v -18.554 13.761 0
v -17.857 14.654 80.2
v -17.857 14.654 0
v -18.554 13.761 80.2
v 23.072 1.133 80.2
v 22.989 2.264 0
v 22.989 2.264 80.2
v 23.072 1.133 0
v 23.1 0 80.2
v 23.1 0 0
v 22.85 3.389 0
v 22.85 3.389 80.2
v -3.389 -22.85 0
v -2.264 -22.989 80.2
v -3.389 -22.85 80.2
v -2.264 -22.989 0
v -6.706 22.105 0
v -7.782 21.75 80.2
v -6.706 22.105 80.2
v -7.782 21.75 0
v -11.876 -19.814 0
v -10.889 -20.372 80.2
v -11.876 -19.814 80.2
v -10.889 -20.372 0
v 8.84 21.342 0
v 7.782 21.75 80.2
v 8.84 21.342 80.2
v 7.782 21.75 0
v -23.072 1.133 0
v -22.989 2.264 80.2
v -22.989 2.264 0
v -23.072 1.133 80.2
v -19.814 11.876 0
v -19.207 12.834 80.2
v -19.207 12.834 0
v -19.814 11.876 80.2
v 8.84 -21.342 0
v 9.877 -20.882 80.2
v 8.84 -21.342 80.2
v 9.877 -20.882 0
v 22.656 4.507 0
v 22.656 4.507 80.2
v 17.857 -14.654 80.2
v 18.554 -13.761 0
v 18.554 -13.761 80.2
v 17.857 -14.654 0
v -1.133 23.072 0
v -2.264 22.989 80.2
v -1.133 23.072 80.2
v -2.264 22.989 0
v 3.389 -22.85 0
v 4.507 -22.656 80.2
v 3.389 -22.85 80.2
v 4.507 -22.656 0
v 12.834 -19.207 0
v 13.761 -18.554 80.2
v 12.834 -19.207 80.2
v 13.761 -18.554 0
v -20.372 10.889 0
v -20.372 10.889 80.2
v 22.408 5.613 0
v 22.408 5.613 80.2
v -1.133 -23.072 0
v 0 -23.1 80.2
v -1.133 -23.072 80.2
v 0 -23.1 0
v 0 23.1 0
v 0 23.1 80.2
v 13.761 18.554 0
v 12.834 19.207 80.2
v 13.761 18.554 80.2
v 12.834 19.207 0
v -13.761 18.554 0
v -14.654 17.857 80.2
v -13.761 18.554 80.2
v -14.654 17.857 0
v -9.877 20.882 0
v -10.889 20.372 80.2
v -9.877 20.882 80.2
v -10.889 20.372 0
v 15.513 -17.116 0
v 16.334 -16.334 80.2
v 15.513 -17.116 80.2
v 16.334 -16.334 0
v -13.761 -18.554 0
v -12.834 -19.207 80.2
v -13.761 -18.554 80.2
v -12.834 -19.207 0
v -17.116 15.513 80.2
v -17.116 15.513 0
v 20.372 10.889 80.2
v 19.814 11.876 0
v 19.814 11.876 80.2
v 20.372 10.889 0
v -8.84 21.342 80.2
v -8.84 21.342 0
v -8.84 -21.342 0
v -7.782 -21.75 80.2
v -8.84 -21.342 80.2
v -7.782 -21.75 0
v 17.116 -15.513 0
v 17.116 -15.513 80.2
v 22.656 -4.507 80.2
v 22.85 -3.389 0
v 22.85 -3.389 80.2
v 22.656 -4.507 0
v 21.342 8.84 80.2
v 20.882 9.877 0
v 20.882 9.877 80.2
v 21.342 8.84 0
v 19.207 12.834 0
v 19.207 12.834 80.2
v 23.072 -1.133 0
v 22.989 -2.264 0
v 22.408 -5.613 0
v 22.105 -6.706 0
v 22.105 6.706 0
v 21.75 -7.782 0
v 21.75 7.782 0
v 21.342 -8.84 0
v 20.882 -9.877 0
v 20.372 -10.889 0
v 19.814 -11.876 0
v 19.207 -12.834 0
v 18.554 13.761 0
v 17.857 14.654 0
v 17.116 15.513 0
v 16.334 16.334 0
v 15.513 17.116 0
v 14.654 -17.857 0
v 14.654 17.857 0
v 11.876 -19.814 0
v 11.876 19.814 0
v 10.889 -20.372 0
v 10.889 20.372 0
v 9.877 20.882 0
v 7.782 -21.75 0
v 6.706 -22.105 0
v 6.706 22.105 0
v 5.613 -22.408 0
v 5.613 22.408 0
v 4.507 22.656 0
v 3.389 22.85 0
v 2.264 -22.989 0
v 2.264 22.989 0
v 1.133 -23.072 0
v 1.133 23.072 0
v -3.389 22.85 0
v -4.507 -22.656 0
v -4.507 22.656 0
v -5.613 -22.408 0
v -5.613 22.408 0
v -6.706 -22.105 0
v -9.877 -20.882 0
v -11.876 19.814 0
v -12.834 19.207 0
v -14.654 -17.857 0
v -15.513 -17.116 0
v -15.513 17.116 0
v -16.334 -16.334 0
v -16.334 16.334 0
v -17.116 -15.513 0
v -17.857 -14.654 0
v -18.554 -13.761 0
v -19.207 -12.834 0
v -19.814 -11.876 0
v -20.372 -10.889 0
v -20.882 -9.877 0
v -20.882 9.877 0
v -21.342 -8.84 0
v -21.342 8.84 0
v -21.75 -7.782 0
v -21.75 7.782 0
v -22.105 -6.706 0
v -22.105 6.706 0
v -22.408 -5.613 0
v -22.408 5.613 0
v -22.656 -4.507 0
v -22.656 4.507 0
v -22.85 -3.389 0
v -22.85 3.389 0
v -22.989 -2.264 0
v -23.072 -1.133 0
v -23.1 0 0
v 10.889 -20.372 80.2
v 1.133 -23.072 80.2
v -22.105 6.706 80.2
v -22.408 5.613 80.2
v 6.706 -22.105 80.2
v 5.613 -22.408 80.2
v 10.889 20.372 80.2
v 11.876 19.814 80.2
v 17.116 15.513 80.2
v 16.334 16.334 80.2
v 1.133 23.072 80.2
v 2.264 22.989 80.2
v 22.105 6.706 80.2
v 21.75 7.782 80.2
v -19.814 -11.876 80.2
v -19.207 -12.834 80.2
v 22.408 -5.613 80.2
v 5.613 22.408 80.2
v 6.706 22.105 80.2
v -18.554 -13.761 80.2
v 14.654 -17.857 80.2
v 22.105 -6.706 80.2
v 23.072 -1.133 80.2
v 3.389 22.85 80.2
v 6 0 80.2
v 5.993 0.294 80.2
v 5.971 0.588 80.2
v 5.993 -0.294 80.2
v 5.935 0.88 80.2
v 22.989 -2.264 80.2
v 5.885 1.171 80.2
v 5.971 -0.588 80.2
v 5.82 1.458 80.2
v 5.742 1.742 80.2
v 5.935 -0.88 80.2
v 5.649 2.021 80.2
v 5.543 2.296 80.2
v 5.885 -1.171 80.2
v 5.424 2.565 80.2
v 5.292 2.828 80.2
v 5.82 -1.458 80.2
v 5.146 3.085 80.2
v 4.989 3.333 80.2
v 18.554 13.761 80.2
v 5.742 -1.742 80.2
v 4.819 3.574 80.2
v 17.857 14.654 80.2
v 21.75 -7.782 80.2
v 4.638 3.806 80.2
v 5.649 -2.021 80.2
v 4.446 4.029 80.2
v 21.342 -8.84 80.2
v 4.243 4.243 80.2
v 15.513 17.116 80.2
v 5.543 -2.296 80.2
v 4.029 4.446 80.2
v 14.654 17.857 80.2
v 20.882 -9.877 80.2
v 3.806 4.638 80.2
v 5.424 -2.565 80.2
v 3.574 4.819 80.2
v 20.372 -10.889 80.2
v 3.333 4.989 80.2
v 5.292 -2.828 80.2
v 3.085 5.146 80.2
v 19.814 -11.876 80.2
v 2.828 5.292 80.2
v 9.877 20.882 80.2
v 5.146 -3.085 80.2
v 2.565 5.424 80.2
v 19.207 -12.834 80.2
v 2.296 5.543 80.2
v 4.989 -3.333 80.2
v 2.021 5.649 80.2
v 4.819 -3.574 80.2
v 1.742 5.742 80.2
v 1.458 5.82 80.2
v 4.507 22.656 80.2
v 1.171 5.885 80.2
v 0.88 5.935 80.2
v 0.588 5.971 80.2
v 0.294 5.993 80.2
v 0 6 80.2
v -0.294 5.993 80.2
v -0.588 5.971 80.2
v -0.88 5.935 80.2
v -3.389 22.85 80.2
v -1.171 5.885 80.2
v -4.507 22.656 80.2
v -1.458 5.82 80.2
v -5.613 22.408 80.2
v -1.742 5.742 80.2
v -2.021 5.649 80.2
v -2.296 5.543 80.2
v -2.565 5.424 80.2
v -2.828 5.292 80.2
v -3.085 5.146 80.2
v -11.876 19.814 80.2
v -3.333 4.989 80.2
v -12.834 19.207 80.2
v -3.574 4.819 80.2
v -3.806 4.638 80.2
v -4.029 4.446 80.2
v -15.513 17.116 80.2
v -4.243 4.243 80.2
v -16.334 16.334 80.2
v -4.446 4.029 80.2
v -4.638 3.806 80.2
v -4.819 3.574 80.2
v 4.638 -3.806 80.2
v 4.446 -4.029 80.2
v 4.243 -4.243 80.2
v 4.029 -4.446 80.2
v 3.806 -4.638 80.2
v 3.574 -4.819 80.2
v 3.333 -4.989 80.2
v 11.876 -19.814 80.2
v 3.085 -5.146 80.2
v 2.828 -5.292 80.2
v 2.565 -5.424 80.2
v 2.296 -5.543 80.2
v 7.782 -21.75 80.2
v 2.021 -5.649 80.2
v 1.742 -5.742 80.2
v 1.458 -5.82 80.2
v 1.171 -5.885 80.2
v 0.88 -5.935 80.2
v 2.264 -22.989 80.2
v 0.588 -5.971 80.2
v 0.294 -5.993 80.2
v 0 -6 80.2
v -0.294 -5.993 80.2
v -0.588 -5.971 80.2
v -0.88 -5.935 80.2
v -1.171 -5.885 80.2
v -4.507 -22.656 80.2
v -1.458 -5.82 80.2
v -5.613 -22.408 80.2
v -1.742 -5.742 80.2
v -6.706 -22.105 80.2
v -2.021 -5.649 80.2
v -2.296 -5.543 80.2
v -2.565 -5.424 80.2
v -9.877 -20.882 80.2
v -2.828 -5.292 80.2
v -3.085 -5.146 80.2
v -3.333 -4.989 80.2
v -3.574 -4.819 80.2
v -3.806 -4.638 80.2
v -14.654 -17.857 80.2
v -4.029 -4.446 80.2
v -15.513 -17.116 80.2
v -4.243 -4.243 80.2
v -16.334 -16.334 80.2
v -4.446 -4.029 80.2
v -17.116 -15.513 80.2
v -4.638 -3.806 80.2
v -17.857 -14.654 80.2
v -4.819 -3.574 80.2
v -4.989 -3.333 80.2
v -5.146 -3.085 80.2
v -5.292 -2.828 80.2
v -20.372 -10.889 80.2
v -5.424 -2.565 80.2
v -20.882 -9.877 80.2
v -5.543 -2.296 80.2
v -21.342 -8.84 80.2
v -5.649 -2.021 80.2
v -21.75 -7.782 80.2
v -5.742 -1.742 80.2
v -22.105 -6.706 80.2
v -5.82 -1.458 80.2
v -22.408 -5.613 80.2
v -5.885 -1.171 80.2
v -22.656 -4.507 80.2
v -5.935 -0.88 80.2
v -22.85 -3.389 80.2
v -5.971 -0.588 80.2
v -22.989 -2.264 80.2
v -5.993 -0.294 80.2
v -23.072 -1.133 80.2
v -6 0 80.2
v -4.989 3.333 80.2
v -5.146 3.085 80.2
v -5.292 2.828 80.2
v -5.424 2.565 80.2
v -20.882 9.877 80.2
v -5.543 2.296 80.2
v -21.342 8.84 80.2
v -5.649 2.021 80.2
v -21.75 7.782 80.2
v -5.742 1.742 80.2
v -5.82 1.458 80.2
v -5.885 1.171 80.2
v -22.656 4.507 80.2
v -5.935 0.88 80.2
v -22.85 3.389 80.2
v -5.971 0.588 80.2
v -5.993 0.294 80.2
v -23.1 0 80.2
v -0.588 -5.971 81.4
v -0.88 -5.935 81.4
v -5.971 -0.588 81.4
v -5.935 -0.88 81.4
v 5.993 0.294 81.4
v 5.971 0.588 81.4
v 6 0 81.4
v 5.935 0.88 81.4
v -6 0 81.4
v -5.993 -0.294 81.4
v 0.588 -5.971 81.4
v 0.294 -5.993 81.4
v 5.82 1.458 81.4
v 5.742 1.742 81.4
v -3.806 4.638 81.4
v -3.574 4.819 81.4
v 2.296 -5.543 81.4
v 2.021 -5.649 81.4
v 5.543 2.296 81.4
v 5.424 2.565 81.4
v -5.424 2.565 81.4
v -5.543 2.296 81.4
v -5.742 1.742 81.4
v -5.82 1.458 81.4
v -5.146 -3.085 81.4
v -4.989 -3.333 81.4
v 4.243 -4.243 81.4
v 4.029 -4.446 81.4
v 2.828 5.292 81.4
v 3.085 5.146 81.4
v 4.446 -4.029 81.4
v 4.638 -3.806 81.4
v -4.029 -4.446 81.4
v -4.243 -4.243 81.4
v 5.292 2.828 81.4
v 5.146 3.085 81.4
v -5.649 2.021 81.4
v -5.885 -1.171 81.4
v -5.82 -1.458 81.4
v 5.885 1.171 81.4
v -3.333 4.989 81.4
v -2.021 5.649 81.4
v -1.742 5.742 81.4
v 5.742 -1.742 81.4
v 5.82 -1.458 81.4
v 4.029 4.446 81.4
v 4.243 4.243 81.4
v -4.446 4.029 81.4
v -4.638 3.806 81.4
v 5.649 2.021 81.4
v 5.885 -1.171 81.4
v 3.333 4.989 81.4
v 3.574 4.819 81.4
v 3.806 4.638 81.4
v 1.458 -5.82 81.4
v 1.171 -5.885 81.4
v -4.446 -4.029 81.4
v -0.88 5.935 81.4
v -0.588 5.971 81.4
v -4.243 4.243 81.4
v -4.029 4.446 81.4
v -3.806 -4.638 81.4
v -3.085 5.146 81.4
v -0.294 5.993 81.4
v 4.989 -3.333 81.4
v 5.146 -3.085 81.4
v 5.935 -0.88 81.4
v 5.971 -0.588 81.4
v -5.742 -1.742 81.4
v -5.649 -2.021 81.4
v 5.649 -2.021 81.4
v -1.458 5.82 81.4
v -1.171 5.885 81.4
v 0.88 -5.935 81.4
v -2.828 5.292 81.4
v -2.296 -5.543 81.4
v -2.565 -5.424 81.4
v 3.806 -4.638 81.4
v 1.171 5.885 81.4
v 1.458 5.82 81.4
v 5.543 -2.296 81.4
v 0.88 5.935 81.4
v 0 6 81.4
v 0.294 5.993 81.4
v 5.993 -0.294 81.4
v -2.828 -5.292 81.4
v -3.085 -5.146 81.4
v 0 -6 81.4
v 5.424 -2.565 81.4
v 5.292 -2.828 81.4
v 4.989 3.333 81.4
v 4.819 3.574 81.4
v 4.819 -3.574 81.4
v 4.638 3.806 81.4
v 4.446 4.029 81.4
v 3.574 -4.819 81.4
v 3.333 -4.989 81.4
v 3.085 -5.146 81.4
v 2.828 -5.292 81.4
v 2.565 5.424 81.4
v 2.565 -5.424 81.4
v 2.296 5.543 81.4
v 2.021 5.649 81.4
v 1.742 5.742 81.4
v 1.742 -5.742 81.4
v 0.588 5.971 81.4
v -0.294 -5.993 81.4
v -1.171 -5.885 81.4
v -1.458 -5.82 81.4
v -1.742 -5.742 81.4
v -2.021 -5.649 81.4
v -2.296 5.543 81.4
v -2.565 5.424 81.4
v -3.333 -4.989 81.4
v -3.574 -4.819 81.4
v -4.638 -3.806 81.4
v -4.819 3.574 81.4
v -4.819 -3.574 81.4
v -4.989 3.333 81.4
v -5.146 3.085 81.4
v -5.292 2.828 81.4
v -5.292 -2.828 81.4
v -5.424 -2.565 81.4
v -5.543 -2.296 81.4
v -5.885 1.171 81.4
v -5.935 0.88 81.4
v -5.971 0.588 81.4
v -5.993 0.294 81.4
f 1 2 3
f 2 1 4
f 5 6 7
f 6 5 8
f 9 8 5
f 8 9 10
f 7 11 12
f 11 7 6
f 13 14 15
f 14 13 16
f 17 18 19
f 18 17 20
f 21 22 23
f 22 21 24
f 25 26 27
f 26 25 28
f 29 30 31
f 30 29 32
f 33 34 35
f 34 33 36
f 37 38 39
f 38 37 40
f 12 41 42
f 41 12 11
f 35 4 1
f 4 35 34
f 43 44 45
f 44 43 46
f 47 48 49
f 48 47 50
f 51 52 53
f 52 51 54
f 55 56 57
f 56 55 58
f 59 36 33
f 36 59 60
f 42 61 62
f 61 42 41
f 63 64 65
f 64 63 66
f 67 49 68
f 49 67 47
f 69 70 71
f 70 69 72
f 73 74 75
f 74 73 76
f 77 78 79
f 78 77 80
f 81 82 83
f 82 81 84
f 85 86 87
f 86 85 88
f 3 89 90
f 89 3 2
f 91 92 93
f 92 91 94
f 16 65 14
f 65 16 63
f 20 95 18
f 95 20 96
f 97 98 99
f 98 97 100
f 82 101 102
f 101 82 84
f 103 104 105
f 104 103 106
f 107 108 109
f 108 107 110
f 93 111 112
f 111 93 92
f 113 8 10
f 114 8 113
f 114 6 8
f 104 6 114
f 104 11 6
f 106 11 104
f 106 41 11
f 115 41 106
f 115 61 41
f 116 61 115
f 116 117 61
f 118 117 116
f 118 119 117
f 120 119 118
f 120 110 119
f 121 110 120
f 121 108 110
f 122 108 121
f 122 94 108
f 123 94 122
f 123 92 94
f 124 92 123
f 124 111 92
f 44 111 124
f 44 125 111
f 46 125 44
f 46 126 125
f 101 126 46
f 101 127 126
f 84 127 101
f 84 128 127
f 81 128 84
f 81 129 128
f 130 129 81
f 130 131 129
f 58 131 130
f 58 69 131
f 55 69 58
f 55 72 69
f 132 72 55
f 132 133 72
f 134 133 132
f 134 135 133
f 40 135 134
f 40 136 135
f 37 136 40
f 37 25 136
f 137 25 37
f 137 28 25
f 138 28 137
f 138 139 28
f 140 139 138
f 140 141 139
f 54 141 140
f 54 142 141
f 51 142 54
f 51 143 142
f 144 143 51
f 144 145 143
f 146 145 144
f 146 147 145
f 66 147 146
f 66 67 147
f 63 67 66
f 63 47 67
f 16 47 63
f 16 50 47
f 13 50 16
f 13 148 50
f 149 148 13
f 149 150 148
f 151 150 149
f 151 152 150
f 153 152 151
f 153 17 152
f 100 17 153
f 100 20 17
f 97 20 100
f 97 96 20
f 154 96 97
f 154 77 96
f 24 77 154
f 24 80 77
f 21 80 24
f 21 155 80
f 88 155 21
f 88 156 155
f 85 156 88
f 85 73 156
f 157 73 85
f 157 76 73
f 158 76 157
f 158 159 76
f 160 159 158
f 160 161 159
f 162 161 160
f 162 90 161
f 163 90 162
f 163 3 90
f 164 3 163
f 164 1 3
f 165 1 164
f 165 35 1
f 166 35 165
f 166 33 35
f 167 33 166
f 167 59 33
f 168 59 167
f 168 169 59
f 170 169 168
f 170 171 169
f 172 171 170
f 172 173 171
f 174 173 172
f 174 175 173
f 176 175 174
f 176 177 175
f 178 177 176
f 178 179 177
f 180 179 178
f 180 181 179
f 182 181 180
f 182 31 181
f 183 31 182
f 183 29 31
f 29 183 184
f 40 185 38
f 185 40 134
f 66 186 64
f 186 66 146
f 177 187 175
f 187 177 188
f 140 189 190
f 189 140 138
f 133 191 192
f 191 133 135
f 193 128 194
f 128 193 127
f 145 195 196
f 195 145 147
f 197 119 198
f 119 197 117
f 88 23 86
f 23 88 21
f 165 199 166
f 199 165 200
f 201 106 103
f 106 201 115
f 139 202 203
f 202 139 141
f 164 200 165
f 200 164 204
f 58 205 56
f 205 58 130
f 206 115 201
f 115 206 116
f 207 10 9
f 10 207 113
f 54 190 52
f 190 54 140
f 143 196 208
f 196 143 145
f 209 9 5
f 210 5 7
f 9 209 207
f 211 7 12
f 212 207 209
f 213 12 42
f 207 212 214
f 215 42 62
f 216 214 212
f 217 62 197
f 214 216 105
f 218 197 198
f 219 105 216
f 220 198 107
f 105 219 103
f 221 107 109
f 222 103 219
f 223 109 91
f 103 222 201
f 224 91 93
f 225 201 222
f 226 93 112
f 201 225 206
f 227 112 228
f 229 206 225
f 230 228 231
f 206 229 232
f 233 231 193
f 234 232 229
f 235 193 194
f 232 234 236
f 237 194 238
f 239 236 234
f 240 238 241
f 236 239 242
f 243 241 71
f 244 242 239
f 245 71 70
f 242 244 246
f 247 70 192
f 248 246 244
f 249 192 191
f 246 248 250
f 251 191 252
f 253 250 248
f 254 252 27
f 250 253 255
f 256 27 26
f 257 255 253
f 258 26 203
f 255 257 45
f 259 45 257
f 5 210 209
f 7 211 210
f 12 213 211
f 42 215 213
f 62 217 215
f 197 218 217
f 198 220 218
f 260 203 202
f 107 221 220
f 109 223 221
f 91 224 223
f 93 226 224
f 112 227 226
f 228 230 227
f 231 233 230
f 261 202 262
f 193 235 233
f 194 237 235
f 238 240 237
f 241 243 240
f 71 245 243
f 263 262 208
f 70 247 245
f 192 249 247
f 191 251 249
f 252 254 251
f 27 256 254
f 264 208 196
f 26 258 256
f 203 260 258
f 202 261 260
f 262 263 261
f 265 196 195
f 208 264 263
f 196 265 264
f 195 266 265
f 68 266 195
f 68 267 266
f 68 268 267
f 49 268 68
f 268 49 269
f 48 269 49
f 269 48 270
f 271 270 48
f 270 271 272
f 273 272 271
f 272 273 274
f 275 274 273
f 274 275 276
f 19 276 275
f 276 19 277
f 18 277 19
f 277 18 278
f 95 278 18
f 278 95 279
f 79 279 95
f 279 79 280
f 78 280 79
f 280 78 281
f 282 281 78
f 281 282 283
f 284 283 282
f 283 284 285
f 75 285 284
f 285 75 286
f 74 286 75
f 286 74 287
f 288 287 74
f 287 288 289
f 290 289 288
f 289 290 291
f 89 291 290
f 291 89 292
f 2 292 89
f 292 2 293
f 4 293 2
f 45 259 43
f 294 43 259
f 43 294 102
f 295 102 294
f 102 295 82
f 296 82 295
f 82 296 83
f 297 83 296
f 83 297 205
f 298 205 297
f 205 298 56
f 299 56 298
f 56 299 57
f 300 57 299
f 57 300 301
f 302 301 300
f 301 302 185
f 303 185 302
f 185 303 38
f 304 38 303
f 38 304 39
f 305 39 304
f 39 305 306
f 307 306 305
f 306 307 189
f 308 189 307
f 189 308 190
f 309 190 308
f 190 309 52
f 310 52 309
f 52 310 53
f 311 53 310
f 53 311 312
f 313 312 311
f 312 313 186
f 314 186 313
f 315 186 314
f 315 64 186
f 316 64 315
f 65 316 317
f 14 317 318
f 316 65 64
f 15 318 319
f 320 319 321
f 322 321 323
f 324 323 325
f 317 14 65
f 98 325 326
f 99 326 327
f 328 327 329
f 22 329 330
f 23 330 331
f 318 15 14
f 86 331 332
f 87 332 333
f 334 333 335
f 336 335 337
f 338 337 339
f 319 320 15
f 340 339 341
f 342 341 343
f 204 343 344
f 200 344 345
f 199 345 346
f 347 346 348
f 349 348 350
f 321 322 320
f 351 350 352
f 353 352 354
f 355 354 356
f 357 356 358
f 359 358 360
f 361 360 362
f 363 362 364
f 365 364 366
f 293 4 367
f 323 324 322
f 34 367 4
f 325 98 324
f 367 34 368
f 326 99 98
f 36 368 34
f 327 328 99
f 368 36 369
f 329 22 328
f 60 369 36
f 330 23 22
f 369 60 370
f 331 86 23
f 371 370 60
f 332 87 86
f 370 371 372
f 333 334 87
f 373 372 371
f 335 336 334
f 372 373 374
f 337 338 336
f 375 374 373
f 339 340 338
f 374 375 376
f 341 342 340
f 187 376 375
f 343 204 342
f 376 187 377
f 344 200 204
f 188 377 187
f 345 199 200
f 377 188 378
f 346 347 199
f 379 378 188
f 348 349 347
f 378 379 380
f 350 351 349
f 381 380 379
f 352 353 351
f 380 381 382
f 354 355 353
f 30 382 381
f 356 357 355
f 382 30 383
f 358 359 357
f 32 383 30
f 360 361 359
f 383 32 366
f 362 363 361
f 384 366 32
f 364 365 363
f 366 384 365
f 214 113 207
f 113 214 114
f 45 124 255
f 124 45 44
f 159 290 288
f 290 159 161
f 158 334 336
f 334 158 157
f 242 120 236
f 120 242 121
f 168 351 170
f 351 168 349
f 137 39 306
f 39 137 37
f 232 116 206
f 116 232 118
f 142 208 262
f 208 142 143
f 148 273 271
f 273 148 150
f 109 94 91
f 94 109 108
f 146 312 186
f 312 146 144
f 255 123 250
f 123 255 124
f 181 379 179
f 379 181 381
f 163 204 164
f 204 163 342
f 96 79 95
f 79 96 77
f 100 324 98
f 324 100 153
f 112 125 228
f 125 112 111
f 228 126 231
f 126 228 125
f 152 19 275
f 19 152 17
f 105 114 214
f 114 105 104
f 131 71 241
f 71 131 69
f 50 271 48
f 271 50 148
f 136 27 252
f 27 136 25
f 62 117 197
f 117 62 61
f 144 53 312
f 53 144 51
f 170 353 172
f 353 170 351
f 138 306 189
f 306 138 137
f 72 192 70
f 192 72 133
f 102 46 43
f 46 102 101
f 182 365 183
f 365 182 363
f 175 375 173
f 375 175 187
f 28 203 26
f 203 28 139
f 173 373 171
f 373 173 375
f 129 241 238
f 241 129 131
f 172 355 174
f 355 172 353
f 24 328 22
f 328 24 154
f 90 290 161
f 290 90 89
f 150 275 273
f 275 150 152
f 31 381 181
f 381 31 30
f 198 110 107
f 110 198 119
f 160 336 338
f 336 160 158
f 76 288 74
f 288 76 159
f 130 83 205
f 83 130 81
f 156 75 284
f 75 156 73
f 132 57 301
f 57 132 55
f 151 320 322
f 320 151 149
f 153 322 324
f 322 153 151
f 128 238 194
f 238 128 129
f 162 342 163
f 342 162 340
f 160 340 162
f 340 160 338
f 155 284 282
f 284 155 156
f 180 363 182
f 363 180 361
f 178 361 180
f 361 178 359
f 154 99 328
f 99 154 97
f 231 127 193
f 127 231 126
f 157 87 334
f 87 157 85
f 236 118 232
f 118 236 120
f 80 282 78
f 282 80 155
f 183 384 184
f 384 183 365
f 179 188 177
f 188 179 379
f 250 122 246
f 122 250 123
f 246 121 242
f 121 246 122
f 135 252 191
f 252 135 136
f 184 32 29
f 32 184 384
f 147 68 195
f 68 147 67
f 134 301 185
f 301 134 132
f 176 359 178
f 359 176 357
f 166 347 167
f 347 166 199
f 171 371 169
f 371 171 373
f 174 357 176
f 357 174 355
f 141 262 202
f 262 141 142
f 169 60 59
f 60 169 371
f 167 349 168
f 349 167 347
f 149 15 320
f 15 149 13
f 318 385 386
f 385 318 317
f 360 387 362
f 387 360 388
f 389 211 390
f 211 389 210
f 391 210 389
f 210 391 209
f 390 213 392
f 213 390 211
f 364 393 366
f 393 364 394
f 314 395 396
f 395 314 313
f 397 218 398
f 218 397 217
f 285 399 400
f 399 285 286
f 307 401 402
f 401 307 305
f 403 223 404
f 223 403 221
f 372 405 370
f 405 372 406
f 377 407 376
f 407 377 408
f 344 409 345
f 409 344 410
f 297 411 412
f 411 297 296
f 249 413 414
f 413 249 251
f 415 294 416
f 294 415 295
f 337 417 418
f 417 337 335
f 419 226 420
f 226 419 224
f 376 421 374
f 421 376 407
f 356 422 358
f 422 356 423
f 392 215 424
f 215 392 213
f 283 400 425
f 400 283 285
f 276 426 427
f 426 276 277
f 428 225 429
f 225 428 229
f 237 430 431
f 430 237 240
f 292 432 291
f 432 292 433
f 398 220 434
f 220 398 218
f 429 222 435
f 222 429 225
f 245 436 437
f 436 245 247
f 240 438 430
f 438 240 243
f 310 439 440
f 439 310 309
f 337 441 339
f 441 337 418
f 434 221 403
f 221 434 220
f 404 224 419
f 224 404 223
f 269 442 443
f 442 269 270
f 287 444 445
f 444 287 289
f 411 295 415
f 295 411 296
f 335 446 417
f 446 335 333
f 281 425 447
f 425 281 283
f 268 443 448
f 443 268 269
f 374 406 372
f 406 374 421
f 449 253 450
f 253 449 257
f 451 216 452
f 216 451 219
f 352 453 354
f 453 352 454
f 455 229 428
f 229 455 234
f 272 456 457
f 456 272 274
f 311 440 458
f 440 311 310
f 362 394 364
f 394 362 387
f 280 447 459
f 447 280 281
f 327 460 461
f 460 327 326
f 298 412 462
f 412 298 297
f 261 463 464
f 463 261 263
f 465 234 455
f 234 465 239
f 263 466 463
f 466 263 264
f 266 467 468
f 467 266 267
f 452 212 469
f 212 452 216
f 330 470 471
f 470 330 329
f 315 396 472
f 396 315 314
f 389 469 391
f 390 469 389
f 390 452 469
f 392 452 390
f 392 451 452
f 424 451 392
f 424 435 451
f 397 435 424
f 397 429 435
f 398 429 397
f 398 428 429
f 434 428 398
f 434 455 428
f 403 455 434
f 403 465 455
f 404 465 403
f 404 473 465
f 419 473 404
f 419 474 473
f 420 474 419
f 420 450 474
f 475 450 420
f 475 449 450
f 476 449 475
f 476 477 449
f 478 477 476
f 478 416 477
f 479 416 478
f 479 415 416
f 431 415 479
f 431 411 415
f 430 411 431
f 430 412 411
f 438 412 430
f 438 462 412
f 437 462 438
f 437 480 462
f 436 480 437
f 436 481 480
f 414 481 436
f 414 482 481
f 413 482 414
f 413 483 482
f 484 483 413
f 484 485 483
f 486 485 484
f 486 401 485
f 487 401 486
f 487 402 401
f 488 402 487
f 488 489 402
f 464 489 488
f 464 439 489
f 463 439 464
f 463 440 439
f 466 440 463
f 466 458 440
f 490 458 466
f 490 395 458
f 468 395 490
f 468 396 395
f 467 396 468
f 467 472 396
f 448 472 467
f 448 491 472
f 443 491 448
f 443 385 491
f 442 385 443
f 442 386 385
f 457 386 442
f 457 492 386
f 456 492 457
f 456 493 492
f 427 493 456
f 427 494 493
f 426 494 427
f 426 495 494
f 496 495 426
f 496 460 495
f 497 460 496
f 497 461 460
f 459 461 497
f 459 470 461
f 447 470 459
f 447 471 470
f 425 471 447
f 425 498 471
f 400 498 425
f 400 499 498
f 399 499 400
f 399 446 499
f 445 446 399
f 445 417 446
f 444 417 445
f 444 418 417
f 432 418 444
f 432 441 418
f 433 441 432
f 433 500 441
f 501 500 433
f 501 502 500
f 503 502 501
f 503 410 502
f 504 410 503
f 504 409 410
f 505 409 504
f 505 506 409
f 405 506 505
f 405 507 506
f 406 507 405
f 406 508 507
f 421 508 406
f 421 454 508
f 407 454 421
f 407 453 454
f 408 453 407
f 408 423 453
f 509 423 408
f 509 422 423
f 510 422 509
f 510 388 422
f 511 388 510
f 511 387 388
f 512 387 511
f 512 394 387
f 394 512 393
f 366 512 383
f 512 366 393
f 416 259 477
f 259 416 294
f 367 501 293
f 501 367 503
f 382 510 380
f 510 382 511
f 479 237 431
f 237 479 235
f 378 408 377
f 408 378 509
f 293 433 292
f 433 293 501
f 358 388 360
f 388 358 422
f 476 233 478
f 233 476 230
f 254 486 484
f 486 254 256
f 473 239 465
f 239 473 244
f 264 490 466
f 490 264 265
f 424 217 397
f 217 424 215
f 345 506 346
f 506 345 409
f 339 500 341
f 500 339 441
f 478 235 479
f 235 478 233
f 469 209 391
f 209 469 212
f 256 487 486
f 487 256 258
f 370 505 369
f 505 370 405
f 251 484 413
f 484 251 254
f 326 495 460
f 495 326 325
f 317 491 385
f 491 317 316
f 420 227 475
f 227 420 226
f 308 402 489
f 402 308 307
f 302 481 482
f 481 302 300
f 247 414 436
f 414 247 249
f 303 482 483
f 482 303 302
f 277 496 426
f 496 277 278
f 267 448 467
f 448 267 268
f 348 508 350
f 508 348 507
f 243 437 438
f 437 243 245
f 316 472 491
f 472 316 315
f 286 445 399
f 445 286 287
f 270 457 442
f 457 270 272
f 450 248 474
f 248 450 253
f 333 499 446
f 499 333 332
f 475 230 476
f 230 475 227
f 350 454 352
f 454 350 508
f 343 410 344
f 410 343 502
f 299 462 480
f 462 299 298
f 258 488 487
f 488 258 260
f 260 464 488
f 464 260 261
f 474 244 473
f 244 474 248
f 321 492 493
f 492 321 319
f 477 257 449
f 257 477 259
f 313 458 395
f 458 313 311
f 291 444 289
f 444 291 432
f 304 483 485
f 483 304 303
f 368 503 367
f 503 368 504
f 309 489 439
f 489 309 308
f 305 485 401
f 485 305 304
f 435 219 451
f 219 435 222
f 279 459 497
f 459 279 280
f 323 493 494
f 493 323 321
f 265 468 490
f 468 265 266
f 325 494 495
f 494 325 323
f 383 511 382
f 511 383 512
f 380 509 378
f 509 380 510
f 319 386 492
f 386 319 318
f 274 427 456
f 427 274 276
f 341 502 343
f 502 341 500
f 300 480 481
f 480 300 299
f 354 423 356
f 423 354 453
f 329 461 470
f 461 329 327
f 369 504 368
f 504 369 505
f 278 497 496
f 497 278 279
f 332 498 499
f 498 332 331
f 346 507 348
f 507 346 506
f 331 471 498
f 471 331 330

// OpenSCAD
// Battery cell: 80.2mm tall, 46.2mm diameter
$fn = 128;

// Parameters
body_height_mm = 80.2;
body_diameter_mm = 46.2;

positive_terminal_diameter_mm = 12;
positive_terminal_height_mm   = 2;

negative_terminal_diameter_mm = 18;
negative_terminal_height_mm   = 0.5;

terminal_overlap_mm = 0.8;   // ensures one connected solid

module battery() {
    body_r = body_diameter_mm/2;
    pos_r  = positive_terminal_diameter_mm/2;
    neg_r  = negative_terminal_diameter_mm/2;

    union() {
        // Main cylindrical body (base at z=0 for predictable placement)
        cylinder(h=body_height_mm, r=body_r, center=false);

        // Positive terminal button (top), overlaps into body
        translate([0, 0, body_height_mm - terminal_overlap_mm])
            cylinder(h=positive_terminal_height_mm, r=pos_r, center=false);

        // Negative terminal contact (bottom), overlaps into body
        translate([0, 0, -negative_terminal_height_mm + terminal_overlap_mm])
            cylinder(h=negative_terminal_height_mm, r=neg_r, center=false);
    }
}

battery();
